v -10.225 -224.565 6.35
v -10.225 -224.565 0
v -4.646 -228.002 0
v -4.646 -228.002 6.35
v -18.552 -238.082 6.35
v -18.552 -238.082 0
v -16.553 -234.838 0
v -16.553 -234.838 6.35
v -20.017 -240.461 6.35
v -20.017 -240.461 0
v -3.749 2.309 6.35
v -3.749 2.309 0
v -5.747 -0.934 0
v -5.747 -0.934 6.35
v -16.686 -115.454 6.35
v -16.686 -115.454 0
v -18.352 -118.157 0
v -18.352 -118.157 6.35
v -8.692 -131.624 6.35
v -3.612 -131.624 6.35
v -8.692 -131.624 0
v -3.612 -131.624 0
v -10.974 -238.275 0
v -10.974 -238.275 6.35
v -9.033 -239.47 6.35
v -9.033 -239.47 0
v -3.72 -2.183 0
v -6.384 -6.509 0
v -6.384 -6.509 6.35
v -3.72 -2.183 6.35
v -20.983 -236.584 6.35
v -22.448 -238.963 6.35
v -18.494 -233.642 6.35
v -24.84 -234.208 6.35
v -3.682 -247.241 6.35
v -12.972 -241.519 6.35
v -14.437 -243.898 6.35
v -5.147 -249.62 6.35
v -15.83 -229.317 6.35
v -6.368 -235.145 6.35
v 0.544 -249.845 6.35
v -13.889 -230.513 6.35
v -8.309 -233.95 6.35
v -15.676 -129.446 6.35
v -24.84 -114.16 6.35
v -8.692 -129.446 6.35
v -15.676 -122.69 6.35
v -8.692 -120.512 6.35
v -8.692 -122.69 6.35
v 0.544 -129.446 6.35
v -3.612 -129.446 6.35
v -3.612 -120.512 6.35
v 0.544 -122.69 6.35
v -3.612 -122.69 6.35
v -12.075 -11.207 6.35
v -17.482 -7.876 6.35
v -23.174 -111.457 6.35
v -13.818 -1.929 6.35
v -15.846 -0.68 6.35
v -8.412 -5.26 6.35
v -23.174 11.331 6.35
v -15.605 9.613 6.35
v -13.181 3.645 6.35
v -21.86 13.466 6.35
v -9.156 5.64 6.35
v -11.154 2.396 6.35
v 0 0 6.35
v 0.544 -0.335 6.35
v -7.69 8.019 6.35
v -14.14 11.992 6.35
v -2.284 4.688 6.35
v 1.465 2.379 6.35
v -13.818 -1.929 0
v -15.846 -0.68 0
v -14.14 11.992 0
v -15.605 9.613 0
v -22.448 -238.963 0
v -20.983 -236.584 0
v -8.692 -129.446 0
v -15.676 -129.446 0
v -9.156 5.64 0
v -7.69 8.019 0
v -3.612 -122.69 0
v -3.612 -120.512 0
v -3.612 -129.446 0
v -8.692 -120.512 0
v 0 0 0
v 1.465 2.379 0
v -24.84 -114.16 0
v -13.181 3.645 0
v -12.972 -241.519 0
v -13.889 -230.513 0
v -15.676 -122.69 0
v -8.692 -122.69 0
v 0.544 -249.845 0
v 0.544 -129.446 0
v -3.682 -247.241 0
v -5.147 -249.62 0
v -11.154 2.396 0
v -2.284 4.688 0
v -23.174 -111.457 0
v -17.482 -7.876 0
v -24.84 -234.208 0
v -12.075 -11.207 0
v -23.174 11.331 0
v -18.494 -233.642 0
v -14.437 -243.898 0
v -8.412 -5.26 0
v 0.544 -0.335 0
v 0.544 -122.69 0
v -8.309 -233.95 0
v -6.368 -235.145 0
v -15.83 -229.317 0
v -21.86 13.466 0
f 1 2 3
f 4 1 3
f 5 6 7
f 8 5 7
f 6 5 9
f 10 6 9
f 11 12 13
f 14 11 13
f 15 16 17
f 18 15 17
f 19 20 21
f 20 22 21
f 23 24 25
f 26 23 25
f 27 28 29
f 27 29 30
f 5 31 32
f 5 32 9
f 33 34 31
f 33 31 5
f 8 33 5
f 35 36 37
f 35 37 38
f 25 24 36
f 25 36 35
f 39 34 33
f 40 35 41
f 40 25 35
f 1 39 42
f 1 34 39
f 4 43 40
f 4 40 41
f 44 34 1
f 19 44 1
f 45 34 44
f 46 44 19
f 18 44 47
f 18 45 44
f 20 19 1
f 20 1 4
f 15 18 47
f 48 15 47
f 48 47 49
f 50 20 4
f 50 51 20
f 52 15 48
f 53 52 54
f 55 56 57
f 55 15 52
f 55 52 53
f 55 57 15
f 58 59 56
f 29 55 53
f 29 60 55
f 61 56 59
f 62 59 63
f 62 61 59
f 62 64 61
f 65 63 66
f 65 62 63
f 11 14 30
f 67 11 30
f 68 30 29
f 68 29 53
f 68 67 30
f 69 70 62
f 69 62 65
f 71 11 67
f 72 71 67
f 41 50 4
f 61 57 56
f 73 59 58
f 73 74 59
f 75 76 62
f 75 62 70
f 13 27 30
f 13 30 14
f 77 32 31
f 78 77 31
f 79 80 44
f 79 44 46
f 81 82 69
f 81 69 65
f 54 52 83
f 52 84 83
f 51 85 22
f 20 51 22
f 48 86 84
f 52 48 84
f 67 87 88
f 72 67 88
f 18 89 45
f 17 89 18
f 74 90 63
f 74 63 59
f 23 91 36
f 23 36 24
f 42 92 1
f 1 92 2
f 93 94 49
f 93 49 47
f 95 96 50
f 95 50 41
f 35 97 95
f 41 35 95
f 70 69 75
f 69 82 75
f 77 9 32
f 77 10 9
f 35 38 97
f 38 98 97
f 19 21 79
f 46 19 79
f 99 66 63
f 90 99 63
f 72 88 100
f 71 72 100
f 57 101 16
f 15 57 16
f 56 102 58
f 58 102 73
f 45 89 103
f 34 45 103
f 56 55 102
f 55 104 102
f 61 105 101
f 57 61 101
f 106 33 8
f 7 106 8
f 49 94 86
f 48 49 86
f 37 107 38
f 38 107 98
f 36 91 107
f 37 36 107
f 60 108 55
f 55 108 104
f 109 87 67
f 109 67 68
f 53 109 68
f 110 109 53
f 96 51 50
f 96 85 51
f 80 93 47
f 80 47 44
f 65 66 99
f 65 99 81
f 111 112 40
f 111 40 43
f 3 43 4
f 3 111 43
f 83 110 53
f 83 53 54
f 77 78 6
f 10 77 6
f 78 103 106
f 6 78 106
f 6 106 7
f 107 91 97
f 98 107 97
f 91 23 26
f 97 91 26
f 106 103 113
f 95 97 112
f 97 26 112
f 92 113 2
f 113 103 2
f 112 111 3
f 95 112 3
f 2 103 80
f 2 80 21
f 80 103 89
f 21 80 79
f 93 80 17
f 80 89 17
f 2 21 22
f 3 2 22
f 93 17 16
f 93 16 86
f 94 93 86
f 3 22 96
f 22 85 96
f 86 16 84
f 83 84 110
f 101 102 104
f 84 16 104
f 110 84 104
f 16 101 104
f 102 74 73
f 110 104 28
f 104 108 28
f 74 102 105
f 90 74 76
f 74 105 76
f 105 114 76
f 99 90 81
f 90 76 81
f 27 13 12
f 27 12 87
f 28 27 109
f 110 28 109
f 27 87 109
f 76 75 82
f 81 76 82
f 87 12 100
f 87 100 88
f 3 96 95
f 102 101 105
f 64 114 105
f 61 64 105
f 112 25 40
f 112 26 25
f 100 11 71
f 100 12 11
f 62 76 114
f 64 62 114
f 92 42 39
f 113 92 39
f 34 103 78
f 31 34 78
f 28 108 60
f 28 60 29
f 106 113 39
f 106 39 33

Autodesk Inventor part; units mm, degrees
ref_plane "YZ Plane" through (0, 0, 0) normal (1, 0, 0) x (0, 1, 0)
ref_plane "XZ Plane" through (0, 0, 0) normal (0, 1, 0) x (-1, 0, 0)
ref_plane "Work Plane1" through (0, 0, 0) normal (0, 0, 1) x (1, 0, 0)
sketch "Sketch1" plane through (0, 0, 0) normal (0, 0, 1) x (1, 0, 0)
  line L0 (-13.9399, 12.3161) -> (-5.7696, 7.2832) projected
  line L1 (-15.6051, 9.6128) -> (-13.9399, 12.3161) projected
  line L2 (-7.4348, 4.5799) -> (-15.6051, 9.6128) projected
  line L3 (-5.7696, 7.2832) -> (-7.4348, 4.5799) construction
  line L4 (-5.4698, 3.3694) -> (-7.4348, 4.5799) construction
  line L5 (-3.8046, 6.0727) -> (1.6652, 2.7033) projected
  line L6 (-5.4698, 3.3694) -> (-3.8046, 6.0727) construction
  line L7 (0, 0) -> (-5.4698, 3.3694) projected
  line L8 (0, 0) -> (1.6652, 2.7033) projected
  line L9 (-5.3472, -249.9446) -> (-16.3579, -243.162) projected
  line L10 (-14.6927, -240.4587) -> (-3.682, -247.2413) projected
  line L11 (-16.3579, -243.162) -> (-14.6927, -240.4587) construction
  line L12 (-9.0019, -247.6933) -> (-20.2167, -240.7849) construction
  line L13 (-6.6483, -245.4141) -> (-18.5515, -238.0817) construction
  line L14 (0.5444, -249.8448) -> (0.5444, -249.8448) projected
  line L15 (0.5444, -2.2912) -> (0.5444, 0.8838) construction
  line L16 (0.5444, 0.8838) -> (0.5444, 0.8838) construction
  line L17 (0.5444, 0.8838) -> (0.5444, -253.0198) construction
  line L18 (0.5444, -253.0198) -> (0.5444, -253.0198) construction
  line L19 (0.5444, -253.0198) -> (0.5444, 0.8838) construction
  line L20 (0.5444, 0.8838) -> (0.5444, 0.8838) construction
  line L21 (0.5444, 0.8838) -> (0.5444, -2.2912) construction
  line L22 (0.5444, -2.2912) -> (0.5444, -2.2912) construction
  line L23 (-7.4904, 8.3432) -> (-9.1556, 5.6399)
  line L24 (-3.7491, 2.3094) -> (-2.0838, 5.0127)
  line L25 (0, 0) -> (0.5444, -0.3354)
  line L26 (0.5444, -0.3354) -> (0.5444, -253.0198)
  line L27 (-12.9719, -241.5187) -> (-14.6371, -244.222)
  line L28 (-15.6051, 9.6128) -> (-23.1742, 14.2754)
  line L29 (-23.1742, 14.2754) -> (-23.1742, -111.4572)
  line L30 (-25.9909, -237.228) -> (-24.3256, -234.5248) construction
  line L31 (-21.0892, -112.7416) -> (-23.1742, -111.4572) construction
  line L32 (-23.1742, -111.4572) -> (0.5444, -126.068) construction
  line L33 (-23.1742, -111.4572) -> (-24.8395, -114.1605) construction
  line L34 (-22.7544, -115.4449) -> (-24.8395, -114.1605) construction
  line L35 (-24.8395, -114.1605) -> (0.5444, -129.797) construction
  line L36 (-24.8395, -114.1605) -> (-24.8395, -234.2082)
  line L37 (-24.3256, -234.5248) -> (-24.8395, -234.2082) construction
  line L38 (-24.8395, -234.2082) -> (-18.5515, -238.0817)
  line L39 (-12.9719, -241.5187) -> (-4.6458, -228.0024)
  line L40 (-18.5515, -238.0817) -> (-10.2253, -224.5653)
  line L41 (-10.2253, -224.5653) -> (-4.6458, -228.0024)
  line L42 (-14.4373, -243.8976) -> (-5.1474, -249.6202)
  line L43 (1.4654, 2.3789) -> (-2.2837, 4.6883)
  line L44 (-7.6902, 8.0188) -> (-14.1397, 11.9917)
  line L45 (0.5444, -122.6898) -> (3.3735, -122.6898) construction
  line L46 (0.5444, -129.4462) -> (3.3735, -129.4462) construction
  line L47 (-3.7491, 2.3094) -> (-12.0752, -11.2069)
  line L48 (-12.0752, -11.2069) -> (-17.4817, -7.8765)
  line L49 (-17.4817, -7.8765) -> (-9.1556, 5.6399)
  line L50 (-14.7785, -9.5417) -> (-4.7871, 6.6779) construction
  line L51 (-15.8457, -0.6803) -> (-6.3842, -6.5086)
  line L52 (-6.3842, -6.5086) -> (-3.7199, -2.1834)
  line L53 (-3.7199, -2.1834) -> (-13.1813, 3.6449)
  line L54 (-13.1813, 3.6449) -> (-15.8457, -0.6803)
  line L55 (-15.8457, -0.6803) -> (-3.7199, -2.1834) construction
  line L56 (-6.3842, -6.5086) -> (-13.1813, 3.6449) construction
  line L57 (-7.4356, -226.2838) -> (-17.4269, -242.5035) construction
  line L58 (-18.4941, -233.6421) -> (-9.0327, -239.4704)
  line L59 (-9.0327, -239.4704) -> (-6.3683, -235.1452)
  line L60 (-6.3683, -235.1452) -> (-15.8298, -229.3169)
  line L61 (-15.8298, -229.3169) -> (-18.4941, -233.6421)
  line L62 (-18.4941, -233.6421) -> (-6.3683, -235.1452) construction
  line L63 (-9.0327, -239.4704) -> (-15.8298, -229.3169) construction
  line L64 (0.5444, -122.6898) -> (-15.6765, -122.6898)
  line L65 (-15.6765, -122.6898) -> (-15.6765, -129.4462)
  line L66 (-15.6765, -129.4462) -> (0.5444, -129.4462)
  line L67 (3.3735, -126.068) -> (-15.6765, -126.068) construction
  line L68 (-8.6915, -131.6242) -> (-8.6915, -120.5117)
  line L69 (-8.6915, -120.5117) -> (-3.6115, -120.5117)
  line L70 (-3.6115, -120.5117) -> (-3.6115, -131.6242)
  line L71 (-3.6115, -131.6242) -> (-8.6915, -131.6242)
  line L72 (-8.6915, -131.6242) -> (-3.6115, -120.5117) construction
  line L73 (-8.6915, -120.5117) -> (-3.6115, -131.6242) construction
  line L74 (-24.8395, -114.1605) -> (-10.9932, -122.6898)
  line L75 (-23.1742, -111.4572) -> (-8.4754, -120.5117)
  line L76 (-16.6864, -115.4537) -> (-18.3516, -118.157)
  line L77 (-20.1943, 16.1688) -> (-21.8595, 13.4656) construction
  line L78 (-21.8595, 13.4656) -> (-23.1742, 11.3313)
  line L79 (-23.2443, -111.414) -> (-24.9095, -114.1173) projected
  line L80 (-3.6115, -131.6242) -> (0.5444, -131.6242)
  line L81 (-3.6115, -120.5117) -> (0.5444, -120.5117)
  line L82 (-3.682, -247.2413) -> (0.5444, -249.8448)
  line L83 (-5.3472, -249.9446) -> (-3.682, -247.2413) projected
  line L84 (-22.6481, -239.2872) -> (-20.9829, -236.5839) projected
  line L85 (-18.3229, -241.9515) -> (-22.6481, -239.2872) projected
  line L86 (-18.5515, -238.0817) -> (-20.2167, -240.7849)
  line L87 (-20.0168, -240.4606) -> (-22.4483, -238.9628)
  line L88 (0.5444, -122.6898) -> (0.5444, -129.4462) projected
  line L89 (0.5444, -122.6898) -> (0.5444, -129.4462) projected
  line L90 (3.3735, -122.6898) -> (3.3735, -129.4462) projected
  line L91 (-3.8046, 6.0727) -> (-5.7696, 7.2832) projected
  point P0 (-6.4523, 3.9747)
  point P1 (-9.7828, -1.4319)
  point P2 (-12.4312, -234.3936)
  point P3 (-6.1515, -126.068)
  point P4 (-16.5532, -234.8378)
  point P5 (-13.8888, -230.5125)
  point P6 (-8.3093, -233.9495)
  point P7 (-10.9736, -238.2748)
  point P8 (0.5444, -129.4462)
  point P9 (-3.6115, -129.4462)
  point P10 (-8.6915, -129.4462)
  point P11 (-8.6915, -122.6898)
  point P12 (-3.6115, -122.6898)
  point P13 (0.5444, -122.6898)
  point P14 (-5.7473, -0.9345)
  point P15 (-8.4117, -5.2597)
  point P16 (-13.8182, -1.9293)
  point P17 (-11.1539, 2.396)
  dimension "d0" = 3.175
  dimension "d1" = 3.175
  dimension "d2" = 2.021
  dimension "d3" = 2.021
  dimension "d5" = 19.05
  dimension "d7" = 0.381
  dimension "d8" = 0.381
  dimension "d10" = 8.89
  dimension "d11" = 11.1125
  dimension "d12" = 5.08
  dimension "d13" = 11.1125
  dimension "d14" = 5.08
  dimension "d15" = 19.05
  dimension "d16" = 11.1125
  dimension "d17" = 5.08
  dimension "d18" = 7.62
  dimension "d21" = 0.381
  dimension "d22" = 19.05
extrude "Extrusion1" add sketch "Sketch1" along normal blind 6.35 contours L44 L23 L2 L1 | L2 L49 L53 L54 L51 L48 L47 L52 L7 L25 L26 L81 L69 L75 L29 L78 L28 | L43 L8 L7 L24 | L75 L69 L68 L64 L74 L76 | L74 L64 L65 L66 L68 L71 L80 L26 L82 L10 L39 L58 L59 L60 L41 L40 L61 L38 L36 | L81 L26 L64 L70 | L66 L26 L80 L70 | L38 L86 L87 L84 | L83 L42 L27 L10
equation "\"d1\" = d0"
equation "\"d3\" = d2"
properties part number "Inner Bracket" material "Polycarbonate, Clear"
